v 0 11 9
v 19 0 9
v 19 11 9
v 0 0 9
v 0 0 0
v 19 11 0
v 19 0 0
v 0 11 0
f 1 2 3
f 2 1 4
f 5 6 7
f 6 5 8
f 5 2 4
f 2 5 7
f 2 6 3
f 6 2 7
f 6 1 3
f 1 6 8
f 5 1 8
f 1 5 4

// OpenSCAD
// Generated by SolidPython 1.0.1 on 2020-07-29 00:46:56


cube(size = [19, 11, 9]);
/***********************************************
*********      SolidPython code:      **********
************************************************
 
# import packages: SolidPython
from solid import *
from solid.utils import *
from itertools import chain, combinations, permutations


class Resize:

    def __init__(self, scad_file):
        self.scad_file = scad_file
        #self.scad_file = import_scad(scad_file)
        # cone/cylinder param:
        self.r1 = 0
        self.r2 = 0
        self.h = 0
        # rectangular prism param:
        self.w = 0
        self.l = 0
        # ellipse param:
        self.r = 0

    # import OpenScad code (file name corresponds to shape)


    # classify shape + parameters
    def assign(self, param1, param2, param3):
        if self.scad_file == 'cone.scad':
            self.r1 = param1
            self.r2 = param2
            self.h = param3
        elif self.scad_file == 'cylinder.scad':
            self.r1 = param1
            self.r2 = param2
            self.h = param3
        elif self.scad_file == 'rectangularPrism.scad':
            self.h = param1
            self.l = param2
            self.w = param3
        else:
            self.r = param1
            self.h = param2

    # resize parameters
    def iterate(self):
        x = range(3, 20, 2)
        i = 1
        if self.scad_file == 'cone.scad':
            tempList = list(permutations(x, 2))
            for temp in tempList:
                param1 = temp[0]
                param2 = temp[1]
                filepath = 'produced_scad_files/' + 'cone' + str(param1) + '_' + str(param2) + '_' + '.scad'
                scad_render_to_file(cylinder(h=param1, r1=param2, r2=0), filepath)

        elif self.scad_file == 'cylinder.scad':
            tempList = list(permutations(x, 3))
            for temp in tempList:
                param1 = temp[0]
                param2 = temp[1]
                filepath = 'produced_scad_files/' + 'cylinder' + str(param1) + '_' + str(param2) + '_' + '.scad'
                scad_render_to_file(cylinder(h=param1, r1=param2, r2=param2), filepath)

        elif self.scad_file == 'rectangularPrism.scad':
            tempList = list(permutations(x, 3))
            for temp in tempList:
                param1 = temp[0]
                param2 = temp[1]
                param3 = temp[2]
                filepath = 'produced_scad_files/' + 'rectangularPrism' + str(param1) + '_' + str(param2) + '_' + str(
                    param3) + '.scad'
                scad_render_to_file(cube(size=(param1, param2, param3)), filepath)

        elif self.scad_file == 'ellipse.scad':
            tempList = list(permutations(x, 4))
            for temp in tempList:
                param1 = temp[0]
                param2 = temp[1]
                param3 = temp[2]
                param4 = temp[3]
                filepath = 'produced_scad_files/' + 'ellipse' + str(param1) + '_' + str(param2) + '_' + str(param3) + '_' + str(param4) + '.scad'
                scad_render_to_file(scale([param1, param2, param3])(sphere(r=param4)), filepath)

    def render_to_scadfile(self):
        scad_render_to_file(scad, 'example.scad') 
 
************************************************/
